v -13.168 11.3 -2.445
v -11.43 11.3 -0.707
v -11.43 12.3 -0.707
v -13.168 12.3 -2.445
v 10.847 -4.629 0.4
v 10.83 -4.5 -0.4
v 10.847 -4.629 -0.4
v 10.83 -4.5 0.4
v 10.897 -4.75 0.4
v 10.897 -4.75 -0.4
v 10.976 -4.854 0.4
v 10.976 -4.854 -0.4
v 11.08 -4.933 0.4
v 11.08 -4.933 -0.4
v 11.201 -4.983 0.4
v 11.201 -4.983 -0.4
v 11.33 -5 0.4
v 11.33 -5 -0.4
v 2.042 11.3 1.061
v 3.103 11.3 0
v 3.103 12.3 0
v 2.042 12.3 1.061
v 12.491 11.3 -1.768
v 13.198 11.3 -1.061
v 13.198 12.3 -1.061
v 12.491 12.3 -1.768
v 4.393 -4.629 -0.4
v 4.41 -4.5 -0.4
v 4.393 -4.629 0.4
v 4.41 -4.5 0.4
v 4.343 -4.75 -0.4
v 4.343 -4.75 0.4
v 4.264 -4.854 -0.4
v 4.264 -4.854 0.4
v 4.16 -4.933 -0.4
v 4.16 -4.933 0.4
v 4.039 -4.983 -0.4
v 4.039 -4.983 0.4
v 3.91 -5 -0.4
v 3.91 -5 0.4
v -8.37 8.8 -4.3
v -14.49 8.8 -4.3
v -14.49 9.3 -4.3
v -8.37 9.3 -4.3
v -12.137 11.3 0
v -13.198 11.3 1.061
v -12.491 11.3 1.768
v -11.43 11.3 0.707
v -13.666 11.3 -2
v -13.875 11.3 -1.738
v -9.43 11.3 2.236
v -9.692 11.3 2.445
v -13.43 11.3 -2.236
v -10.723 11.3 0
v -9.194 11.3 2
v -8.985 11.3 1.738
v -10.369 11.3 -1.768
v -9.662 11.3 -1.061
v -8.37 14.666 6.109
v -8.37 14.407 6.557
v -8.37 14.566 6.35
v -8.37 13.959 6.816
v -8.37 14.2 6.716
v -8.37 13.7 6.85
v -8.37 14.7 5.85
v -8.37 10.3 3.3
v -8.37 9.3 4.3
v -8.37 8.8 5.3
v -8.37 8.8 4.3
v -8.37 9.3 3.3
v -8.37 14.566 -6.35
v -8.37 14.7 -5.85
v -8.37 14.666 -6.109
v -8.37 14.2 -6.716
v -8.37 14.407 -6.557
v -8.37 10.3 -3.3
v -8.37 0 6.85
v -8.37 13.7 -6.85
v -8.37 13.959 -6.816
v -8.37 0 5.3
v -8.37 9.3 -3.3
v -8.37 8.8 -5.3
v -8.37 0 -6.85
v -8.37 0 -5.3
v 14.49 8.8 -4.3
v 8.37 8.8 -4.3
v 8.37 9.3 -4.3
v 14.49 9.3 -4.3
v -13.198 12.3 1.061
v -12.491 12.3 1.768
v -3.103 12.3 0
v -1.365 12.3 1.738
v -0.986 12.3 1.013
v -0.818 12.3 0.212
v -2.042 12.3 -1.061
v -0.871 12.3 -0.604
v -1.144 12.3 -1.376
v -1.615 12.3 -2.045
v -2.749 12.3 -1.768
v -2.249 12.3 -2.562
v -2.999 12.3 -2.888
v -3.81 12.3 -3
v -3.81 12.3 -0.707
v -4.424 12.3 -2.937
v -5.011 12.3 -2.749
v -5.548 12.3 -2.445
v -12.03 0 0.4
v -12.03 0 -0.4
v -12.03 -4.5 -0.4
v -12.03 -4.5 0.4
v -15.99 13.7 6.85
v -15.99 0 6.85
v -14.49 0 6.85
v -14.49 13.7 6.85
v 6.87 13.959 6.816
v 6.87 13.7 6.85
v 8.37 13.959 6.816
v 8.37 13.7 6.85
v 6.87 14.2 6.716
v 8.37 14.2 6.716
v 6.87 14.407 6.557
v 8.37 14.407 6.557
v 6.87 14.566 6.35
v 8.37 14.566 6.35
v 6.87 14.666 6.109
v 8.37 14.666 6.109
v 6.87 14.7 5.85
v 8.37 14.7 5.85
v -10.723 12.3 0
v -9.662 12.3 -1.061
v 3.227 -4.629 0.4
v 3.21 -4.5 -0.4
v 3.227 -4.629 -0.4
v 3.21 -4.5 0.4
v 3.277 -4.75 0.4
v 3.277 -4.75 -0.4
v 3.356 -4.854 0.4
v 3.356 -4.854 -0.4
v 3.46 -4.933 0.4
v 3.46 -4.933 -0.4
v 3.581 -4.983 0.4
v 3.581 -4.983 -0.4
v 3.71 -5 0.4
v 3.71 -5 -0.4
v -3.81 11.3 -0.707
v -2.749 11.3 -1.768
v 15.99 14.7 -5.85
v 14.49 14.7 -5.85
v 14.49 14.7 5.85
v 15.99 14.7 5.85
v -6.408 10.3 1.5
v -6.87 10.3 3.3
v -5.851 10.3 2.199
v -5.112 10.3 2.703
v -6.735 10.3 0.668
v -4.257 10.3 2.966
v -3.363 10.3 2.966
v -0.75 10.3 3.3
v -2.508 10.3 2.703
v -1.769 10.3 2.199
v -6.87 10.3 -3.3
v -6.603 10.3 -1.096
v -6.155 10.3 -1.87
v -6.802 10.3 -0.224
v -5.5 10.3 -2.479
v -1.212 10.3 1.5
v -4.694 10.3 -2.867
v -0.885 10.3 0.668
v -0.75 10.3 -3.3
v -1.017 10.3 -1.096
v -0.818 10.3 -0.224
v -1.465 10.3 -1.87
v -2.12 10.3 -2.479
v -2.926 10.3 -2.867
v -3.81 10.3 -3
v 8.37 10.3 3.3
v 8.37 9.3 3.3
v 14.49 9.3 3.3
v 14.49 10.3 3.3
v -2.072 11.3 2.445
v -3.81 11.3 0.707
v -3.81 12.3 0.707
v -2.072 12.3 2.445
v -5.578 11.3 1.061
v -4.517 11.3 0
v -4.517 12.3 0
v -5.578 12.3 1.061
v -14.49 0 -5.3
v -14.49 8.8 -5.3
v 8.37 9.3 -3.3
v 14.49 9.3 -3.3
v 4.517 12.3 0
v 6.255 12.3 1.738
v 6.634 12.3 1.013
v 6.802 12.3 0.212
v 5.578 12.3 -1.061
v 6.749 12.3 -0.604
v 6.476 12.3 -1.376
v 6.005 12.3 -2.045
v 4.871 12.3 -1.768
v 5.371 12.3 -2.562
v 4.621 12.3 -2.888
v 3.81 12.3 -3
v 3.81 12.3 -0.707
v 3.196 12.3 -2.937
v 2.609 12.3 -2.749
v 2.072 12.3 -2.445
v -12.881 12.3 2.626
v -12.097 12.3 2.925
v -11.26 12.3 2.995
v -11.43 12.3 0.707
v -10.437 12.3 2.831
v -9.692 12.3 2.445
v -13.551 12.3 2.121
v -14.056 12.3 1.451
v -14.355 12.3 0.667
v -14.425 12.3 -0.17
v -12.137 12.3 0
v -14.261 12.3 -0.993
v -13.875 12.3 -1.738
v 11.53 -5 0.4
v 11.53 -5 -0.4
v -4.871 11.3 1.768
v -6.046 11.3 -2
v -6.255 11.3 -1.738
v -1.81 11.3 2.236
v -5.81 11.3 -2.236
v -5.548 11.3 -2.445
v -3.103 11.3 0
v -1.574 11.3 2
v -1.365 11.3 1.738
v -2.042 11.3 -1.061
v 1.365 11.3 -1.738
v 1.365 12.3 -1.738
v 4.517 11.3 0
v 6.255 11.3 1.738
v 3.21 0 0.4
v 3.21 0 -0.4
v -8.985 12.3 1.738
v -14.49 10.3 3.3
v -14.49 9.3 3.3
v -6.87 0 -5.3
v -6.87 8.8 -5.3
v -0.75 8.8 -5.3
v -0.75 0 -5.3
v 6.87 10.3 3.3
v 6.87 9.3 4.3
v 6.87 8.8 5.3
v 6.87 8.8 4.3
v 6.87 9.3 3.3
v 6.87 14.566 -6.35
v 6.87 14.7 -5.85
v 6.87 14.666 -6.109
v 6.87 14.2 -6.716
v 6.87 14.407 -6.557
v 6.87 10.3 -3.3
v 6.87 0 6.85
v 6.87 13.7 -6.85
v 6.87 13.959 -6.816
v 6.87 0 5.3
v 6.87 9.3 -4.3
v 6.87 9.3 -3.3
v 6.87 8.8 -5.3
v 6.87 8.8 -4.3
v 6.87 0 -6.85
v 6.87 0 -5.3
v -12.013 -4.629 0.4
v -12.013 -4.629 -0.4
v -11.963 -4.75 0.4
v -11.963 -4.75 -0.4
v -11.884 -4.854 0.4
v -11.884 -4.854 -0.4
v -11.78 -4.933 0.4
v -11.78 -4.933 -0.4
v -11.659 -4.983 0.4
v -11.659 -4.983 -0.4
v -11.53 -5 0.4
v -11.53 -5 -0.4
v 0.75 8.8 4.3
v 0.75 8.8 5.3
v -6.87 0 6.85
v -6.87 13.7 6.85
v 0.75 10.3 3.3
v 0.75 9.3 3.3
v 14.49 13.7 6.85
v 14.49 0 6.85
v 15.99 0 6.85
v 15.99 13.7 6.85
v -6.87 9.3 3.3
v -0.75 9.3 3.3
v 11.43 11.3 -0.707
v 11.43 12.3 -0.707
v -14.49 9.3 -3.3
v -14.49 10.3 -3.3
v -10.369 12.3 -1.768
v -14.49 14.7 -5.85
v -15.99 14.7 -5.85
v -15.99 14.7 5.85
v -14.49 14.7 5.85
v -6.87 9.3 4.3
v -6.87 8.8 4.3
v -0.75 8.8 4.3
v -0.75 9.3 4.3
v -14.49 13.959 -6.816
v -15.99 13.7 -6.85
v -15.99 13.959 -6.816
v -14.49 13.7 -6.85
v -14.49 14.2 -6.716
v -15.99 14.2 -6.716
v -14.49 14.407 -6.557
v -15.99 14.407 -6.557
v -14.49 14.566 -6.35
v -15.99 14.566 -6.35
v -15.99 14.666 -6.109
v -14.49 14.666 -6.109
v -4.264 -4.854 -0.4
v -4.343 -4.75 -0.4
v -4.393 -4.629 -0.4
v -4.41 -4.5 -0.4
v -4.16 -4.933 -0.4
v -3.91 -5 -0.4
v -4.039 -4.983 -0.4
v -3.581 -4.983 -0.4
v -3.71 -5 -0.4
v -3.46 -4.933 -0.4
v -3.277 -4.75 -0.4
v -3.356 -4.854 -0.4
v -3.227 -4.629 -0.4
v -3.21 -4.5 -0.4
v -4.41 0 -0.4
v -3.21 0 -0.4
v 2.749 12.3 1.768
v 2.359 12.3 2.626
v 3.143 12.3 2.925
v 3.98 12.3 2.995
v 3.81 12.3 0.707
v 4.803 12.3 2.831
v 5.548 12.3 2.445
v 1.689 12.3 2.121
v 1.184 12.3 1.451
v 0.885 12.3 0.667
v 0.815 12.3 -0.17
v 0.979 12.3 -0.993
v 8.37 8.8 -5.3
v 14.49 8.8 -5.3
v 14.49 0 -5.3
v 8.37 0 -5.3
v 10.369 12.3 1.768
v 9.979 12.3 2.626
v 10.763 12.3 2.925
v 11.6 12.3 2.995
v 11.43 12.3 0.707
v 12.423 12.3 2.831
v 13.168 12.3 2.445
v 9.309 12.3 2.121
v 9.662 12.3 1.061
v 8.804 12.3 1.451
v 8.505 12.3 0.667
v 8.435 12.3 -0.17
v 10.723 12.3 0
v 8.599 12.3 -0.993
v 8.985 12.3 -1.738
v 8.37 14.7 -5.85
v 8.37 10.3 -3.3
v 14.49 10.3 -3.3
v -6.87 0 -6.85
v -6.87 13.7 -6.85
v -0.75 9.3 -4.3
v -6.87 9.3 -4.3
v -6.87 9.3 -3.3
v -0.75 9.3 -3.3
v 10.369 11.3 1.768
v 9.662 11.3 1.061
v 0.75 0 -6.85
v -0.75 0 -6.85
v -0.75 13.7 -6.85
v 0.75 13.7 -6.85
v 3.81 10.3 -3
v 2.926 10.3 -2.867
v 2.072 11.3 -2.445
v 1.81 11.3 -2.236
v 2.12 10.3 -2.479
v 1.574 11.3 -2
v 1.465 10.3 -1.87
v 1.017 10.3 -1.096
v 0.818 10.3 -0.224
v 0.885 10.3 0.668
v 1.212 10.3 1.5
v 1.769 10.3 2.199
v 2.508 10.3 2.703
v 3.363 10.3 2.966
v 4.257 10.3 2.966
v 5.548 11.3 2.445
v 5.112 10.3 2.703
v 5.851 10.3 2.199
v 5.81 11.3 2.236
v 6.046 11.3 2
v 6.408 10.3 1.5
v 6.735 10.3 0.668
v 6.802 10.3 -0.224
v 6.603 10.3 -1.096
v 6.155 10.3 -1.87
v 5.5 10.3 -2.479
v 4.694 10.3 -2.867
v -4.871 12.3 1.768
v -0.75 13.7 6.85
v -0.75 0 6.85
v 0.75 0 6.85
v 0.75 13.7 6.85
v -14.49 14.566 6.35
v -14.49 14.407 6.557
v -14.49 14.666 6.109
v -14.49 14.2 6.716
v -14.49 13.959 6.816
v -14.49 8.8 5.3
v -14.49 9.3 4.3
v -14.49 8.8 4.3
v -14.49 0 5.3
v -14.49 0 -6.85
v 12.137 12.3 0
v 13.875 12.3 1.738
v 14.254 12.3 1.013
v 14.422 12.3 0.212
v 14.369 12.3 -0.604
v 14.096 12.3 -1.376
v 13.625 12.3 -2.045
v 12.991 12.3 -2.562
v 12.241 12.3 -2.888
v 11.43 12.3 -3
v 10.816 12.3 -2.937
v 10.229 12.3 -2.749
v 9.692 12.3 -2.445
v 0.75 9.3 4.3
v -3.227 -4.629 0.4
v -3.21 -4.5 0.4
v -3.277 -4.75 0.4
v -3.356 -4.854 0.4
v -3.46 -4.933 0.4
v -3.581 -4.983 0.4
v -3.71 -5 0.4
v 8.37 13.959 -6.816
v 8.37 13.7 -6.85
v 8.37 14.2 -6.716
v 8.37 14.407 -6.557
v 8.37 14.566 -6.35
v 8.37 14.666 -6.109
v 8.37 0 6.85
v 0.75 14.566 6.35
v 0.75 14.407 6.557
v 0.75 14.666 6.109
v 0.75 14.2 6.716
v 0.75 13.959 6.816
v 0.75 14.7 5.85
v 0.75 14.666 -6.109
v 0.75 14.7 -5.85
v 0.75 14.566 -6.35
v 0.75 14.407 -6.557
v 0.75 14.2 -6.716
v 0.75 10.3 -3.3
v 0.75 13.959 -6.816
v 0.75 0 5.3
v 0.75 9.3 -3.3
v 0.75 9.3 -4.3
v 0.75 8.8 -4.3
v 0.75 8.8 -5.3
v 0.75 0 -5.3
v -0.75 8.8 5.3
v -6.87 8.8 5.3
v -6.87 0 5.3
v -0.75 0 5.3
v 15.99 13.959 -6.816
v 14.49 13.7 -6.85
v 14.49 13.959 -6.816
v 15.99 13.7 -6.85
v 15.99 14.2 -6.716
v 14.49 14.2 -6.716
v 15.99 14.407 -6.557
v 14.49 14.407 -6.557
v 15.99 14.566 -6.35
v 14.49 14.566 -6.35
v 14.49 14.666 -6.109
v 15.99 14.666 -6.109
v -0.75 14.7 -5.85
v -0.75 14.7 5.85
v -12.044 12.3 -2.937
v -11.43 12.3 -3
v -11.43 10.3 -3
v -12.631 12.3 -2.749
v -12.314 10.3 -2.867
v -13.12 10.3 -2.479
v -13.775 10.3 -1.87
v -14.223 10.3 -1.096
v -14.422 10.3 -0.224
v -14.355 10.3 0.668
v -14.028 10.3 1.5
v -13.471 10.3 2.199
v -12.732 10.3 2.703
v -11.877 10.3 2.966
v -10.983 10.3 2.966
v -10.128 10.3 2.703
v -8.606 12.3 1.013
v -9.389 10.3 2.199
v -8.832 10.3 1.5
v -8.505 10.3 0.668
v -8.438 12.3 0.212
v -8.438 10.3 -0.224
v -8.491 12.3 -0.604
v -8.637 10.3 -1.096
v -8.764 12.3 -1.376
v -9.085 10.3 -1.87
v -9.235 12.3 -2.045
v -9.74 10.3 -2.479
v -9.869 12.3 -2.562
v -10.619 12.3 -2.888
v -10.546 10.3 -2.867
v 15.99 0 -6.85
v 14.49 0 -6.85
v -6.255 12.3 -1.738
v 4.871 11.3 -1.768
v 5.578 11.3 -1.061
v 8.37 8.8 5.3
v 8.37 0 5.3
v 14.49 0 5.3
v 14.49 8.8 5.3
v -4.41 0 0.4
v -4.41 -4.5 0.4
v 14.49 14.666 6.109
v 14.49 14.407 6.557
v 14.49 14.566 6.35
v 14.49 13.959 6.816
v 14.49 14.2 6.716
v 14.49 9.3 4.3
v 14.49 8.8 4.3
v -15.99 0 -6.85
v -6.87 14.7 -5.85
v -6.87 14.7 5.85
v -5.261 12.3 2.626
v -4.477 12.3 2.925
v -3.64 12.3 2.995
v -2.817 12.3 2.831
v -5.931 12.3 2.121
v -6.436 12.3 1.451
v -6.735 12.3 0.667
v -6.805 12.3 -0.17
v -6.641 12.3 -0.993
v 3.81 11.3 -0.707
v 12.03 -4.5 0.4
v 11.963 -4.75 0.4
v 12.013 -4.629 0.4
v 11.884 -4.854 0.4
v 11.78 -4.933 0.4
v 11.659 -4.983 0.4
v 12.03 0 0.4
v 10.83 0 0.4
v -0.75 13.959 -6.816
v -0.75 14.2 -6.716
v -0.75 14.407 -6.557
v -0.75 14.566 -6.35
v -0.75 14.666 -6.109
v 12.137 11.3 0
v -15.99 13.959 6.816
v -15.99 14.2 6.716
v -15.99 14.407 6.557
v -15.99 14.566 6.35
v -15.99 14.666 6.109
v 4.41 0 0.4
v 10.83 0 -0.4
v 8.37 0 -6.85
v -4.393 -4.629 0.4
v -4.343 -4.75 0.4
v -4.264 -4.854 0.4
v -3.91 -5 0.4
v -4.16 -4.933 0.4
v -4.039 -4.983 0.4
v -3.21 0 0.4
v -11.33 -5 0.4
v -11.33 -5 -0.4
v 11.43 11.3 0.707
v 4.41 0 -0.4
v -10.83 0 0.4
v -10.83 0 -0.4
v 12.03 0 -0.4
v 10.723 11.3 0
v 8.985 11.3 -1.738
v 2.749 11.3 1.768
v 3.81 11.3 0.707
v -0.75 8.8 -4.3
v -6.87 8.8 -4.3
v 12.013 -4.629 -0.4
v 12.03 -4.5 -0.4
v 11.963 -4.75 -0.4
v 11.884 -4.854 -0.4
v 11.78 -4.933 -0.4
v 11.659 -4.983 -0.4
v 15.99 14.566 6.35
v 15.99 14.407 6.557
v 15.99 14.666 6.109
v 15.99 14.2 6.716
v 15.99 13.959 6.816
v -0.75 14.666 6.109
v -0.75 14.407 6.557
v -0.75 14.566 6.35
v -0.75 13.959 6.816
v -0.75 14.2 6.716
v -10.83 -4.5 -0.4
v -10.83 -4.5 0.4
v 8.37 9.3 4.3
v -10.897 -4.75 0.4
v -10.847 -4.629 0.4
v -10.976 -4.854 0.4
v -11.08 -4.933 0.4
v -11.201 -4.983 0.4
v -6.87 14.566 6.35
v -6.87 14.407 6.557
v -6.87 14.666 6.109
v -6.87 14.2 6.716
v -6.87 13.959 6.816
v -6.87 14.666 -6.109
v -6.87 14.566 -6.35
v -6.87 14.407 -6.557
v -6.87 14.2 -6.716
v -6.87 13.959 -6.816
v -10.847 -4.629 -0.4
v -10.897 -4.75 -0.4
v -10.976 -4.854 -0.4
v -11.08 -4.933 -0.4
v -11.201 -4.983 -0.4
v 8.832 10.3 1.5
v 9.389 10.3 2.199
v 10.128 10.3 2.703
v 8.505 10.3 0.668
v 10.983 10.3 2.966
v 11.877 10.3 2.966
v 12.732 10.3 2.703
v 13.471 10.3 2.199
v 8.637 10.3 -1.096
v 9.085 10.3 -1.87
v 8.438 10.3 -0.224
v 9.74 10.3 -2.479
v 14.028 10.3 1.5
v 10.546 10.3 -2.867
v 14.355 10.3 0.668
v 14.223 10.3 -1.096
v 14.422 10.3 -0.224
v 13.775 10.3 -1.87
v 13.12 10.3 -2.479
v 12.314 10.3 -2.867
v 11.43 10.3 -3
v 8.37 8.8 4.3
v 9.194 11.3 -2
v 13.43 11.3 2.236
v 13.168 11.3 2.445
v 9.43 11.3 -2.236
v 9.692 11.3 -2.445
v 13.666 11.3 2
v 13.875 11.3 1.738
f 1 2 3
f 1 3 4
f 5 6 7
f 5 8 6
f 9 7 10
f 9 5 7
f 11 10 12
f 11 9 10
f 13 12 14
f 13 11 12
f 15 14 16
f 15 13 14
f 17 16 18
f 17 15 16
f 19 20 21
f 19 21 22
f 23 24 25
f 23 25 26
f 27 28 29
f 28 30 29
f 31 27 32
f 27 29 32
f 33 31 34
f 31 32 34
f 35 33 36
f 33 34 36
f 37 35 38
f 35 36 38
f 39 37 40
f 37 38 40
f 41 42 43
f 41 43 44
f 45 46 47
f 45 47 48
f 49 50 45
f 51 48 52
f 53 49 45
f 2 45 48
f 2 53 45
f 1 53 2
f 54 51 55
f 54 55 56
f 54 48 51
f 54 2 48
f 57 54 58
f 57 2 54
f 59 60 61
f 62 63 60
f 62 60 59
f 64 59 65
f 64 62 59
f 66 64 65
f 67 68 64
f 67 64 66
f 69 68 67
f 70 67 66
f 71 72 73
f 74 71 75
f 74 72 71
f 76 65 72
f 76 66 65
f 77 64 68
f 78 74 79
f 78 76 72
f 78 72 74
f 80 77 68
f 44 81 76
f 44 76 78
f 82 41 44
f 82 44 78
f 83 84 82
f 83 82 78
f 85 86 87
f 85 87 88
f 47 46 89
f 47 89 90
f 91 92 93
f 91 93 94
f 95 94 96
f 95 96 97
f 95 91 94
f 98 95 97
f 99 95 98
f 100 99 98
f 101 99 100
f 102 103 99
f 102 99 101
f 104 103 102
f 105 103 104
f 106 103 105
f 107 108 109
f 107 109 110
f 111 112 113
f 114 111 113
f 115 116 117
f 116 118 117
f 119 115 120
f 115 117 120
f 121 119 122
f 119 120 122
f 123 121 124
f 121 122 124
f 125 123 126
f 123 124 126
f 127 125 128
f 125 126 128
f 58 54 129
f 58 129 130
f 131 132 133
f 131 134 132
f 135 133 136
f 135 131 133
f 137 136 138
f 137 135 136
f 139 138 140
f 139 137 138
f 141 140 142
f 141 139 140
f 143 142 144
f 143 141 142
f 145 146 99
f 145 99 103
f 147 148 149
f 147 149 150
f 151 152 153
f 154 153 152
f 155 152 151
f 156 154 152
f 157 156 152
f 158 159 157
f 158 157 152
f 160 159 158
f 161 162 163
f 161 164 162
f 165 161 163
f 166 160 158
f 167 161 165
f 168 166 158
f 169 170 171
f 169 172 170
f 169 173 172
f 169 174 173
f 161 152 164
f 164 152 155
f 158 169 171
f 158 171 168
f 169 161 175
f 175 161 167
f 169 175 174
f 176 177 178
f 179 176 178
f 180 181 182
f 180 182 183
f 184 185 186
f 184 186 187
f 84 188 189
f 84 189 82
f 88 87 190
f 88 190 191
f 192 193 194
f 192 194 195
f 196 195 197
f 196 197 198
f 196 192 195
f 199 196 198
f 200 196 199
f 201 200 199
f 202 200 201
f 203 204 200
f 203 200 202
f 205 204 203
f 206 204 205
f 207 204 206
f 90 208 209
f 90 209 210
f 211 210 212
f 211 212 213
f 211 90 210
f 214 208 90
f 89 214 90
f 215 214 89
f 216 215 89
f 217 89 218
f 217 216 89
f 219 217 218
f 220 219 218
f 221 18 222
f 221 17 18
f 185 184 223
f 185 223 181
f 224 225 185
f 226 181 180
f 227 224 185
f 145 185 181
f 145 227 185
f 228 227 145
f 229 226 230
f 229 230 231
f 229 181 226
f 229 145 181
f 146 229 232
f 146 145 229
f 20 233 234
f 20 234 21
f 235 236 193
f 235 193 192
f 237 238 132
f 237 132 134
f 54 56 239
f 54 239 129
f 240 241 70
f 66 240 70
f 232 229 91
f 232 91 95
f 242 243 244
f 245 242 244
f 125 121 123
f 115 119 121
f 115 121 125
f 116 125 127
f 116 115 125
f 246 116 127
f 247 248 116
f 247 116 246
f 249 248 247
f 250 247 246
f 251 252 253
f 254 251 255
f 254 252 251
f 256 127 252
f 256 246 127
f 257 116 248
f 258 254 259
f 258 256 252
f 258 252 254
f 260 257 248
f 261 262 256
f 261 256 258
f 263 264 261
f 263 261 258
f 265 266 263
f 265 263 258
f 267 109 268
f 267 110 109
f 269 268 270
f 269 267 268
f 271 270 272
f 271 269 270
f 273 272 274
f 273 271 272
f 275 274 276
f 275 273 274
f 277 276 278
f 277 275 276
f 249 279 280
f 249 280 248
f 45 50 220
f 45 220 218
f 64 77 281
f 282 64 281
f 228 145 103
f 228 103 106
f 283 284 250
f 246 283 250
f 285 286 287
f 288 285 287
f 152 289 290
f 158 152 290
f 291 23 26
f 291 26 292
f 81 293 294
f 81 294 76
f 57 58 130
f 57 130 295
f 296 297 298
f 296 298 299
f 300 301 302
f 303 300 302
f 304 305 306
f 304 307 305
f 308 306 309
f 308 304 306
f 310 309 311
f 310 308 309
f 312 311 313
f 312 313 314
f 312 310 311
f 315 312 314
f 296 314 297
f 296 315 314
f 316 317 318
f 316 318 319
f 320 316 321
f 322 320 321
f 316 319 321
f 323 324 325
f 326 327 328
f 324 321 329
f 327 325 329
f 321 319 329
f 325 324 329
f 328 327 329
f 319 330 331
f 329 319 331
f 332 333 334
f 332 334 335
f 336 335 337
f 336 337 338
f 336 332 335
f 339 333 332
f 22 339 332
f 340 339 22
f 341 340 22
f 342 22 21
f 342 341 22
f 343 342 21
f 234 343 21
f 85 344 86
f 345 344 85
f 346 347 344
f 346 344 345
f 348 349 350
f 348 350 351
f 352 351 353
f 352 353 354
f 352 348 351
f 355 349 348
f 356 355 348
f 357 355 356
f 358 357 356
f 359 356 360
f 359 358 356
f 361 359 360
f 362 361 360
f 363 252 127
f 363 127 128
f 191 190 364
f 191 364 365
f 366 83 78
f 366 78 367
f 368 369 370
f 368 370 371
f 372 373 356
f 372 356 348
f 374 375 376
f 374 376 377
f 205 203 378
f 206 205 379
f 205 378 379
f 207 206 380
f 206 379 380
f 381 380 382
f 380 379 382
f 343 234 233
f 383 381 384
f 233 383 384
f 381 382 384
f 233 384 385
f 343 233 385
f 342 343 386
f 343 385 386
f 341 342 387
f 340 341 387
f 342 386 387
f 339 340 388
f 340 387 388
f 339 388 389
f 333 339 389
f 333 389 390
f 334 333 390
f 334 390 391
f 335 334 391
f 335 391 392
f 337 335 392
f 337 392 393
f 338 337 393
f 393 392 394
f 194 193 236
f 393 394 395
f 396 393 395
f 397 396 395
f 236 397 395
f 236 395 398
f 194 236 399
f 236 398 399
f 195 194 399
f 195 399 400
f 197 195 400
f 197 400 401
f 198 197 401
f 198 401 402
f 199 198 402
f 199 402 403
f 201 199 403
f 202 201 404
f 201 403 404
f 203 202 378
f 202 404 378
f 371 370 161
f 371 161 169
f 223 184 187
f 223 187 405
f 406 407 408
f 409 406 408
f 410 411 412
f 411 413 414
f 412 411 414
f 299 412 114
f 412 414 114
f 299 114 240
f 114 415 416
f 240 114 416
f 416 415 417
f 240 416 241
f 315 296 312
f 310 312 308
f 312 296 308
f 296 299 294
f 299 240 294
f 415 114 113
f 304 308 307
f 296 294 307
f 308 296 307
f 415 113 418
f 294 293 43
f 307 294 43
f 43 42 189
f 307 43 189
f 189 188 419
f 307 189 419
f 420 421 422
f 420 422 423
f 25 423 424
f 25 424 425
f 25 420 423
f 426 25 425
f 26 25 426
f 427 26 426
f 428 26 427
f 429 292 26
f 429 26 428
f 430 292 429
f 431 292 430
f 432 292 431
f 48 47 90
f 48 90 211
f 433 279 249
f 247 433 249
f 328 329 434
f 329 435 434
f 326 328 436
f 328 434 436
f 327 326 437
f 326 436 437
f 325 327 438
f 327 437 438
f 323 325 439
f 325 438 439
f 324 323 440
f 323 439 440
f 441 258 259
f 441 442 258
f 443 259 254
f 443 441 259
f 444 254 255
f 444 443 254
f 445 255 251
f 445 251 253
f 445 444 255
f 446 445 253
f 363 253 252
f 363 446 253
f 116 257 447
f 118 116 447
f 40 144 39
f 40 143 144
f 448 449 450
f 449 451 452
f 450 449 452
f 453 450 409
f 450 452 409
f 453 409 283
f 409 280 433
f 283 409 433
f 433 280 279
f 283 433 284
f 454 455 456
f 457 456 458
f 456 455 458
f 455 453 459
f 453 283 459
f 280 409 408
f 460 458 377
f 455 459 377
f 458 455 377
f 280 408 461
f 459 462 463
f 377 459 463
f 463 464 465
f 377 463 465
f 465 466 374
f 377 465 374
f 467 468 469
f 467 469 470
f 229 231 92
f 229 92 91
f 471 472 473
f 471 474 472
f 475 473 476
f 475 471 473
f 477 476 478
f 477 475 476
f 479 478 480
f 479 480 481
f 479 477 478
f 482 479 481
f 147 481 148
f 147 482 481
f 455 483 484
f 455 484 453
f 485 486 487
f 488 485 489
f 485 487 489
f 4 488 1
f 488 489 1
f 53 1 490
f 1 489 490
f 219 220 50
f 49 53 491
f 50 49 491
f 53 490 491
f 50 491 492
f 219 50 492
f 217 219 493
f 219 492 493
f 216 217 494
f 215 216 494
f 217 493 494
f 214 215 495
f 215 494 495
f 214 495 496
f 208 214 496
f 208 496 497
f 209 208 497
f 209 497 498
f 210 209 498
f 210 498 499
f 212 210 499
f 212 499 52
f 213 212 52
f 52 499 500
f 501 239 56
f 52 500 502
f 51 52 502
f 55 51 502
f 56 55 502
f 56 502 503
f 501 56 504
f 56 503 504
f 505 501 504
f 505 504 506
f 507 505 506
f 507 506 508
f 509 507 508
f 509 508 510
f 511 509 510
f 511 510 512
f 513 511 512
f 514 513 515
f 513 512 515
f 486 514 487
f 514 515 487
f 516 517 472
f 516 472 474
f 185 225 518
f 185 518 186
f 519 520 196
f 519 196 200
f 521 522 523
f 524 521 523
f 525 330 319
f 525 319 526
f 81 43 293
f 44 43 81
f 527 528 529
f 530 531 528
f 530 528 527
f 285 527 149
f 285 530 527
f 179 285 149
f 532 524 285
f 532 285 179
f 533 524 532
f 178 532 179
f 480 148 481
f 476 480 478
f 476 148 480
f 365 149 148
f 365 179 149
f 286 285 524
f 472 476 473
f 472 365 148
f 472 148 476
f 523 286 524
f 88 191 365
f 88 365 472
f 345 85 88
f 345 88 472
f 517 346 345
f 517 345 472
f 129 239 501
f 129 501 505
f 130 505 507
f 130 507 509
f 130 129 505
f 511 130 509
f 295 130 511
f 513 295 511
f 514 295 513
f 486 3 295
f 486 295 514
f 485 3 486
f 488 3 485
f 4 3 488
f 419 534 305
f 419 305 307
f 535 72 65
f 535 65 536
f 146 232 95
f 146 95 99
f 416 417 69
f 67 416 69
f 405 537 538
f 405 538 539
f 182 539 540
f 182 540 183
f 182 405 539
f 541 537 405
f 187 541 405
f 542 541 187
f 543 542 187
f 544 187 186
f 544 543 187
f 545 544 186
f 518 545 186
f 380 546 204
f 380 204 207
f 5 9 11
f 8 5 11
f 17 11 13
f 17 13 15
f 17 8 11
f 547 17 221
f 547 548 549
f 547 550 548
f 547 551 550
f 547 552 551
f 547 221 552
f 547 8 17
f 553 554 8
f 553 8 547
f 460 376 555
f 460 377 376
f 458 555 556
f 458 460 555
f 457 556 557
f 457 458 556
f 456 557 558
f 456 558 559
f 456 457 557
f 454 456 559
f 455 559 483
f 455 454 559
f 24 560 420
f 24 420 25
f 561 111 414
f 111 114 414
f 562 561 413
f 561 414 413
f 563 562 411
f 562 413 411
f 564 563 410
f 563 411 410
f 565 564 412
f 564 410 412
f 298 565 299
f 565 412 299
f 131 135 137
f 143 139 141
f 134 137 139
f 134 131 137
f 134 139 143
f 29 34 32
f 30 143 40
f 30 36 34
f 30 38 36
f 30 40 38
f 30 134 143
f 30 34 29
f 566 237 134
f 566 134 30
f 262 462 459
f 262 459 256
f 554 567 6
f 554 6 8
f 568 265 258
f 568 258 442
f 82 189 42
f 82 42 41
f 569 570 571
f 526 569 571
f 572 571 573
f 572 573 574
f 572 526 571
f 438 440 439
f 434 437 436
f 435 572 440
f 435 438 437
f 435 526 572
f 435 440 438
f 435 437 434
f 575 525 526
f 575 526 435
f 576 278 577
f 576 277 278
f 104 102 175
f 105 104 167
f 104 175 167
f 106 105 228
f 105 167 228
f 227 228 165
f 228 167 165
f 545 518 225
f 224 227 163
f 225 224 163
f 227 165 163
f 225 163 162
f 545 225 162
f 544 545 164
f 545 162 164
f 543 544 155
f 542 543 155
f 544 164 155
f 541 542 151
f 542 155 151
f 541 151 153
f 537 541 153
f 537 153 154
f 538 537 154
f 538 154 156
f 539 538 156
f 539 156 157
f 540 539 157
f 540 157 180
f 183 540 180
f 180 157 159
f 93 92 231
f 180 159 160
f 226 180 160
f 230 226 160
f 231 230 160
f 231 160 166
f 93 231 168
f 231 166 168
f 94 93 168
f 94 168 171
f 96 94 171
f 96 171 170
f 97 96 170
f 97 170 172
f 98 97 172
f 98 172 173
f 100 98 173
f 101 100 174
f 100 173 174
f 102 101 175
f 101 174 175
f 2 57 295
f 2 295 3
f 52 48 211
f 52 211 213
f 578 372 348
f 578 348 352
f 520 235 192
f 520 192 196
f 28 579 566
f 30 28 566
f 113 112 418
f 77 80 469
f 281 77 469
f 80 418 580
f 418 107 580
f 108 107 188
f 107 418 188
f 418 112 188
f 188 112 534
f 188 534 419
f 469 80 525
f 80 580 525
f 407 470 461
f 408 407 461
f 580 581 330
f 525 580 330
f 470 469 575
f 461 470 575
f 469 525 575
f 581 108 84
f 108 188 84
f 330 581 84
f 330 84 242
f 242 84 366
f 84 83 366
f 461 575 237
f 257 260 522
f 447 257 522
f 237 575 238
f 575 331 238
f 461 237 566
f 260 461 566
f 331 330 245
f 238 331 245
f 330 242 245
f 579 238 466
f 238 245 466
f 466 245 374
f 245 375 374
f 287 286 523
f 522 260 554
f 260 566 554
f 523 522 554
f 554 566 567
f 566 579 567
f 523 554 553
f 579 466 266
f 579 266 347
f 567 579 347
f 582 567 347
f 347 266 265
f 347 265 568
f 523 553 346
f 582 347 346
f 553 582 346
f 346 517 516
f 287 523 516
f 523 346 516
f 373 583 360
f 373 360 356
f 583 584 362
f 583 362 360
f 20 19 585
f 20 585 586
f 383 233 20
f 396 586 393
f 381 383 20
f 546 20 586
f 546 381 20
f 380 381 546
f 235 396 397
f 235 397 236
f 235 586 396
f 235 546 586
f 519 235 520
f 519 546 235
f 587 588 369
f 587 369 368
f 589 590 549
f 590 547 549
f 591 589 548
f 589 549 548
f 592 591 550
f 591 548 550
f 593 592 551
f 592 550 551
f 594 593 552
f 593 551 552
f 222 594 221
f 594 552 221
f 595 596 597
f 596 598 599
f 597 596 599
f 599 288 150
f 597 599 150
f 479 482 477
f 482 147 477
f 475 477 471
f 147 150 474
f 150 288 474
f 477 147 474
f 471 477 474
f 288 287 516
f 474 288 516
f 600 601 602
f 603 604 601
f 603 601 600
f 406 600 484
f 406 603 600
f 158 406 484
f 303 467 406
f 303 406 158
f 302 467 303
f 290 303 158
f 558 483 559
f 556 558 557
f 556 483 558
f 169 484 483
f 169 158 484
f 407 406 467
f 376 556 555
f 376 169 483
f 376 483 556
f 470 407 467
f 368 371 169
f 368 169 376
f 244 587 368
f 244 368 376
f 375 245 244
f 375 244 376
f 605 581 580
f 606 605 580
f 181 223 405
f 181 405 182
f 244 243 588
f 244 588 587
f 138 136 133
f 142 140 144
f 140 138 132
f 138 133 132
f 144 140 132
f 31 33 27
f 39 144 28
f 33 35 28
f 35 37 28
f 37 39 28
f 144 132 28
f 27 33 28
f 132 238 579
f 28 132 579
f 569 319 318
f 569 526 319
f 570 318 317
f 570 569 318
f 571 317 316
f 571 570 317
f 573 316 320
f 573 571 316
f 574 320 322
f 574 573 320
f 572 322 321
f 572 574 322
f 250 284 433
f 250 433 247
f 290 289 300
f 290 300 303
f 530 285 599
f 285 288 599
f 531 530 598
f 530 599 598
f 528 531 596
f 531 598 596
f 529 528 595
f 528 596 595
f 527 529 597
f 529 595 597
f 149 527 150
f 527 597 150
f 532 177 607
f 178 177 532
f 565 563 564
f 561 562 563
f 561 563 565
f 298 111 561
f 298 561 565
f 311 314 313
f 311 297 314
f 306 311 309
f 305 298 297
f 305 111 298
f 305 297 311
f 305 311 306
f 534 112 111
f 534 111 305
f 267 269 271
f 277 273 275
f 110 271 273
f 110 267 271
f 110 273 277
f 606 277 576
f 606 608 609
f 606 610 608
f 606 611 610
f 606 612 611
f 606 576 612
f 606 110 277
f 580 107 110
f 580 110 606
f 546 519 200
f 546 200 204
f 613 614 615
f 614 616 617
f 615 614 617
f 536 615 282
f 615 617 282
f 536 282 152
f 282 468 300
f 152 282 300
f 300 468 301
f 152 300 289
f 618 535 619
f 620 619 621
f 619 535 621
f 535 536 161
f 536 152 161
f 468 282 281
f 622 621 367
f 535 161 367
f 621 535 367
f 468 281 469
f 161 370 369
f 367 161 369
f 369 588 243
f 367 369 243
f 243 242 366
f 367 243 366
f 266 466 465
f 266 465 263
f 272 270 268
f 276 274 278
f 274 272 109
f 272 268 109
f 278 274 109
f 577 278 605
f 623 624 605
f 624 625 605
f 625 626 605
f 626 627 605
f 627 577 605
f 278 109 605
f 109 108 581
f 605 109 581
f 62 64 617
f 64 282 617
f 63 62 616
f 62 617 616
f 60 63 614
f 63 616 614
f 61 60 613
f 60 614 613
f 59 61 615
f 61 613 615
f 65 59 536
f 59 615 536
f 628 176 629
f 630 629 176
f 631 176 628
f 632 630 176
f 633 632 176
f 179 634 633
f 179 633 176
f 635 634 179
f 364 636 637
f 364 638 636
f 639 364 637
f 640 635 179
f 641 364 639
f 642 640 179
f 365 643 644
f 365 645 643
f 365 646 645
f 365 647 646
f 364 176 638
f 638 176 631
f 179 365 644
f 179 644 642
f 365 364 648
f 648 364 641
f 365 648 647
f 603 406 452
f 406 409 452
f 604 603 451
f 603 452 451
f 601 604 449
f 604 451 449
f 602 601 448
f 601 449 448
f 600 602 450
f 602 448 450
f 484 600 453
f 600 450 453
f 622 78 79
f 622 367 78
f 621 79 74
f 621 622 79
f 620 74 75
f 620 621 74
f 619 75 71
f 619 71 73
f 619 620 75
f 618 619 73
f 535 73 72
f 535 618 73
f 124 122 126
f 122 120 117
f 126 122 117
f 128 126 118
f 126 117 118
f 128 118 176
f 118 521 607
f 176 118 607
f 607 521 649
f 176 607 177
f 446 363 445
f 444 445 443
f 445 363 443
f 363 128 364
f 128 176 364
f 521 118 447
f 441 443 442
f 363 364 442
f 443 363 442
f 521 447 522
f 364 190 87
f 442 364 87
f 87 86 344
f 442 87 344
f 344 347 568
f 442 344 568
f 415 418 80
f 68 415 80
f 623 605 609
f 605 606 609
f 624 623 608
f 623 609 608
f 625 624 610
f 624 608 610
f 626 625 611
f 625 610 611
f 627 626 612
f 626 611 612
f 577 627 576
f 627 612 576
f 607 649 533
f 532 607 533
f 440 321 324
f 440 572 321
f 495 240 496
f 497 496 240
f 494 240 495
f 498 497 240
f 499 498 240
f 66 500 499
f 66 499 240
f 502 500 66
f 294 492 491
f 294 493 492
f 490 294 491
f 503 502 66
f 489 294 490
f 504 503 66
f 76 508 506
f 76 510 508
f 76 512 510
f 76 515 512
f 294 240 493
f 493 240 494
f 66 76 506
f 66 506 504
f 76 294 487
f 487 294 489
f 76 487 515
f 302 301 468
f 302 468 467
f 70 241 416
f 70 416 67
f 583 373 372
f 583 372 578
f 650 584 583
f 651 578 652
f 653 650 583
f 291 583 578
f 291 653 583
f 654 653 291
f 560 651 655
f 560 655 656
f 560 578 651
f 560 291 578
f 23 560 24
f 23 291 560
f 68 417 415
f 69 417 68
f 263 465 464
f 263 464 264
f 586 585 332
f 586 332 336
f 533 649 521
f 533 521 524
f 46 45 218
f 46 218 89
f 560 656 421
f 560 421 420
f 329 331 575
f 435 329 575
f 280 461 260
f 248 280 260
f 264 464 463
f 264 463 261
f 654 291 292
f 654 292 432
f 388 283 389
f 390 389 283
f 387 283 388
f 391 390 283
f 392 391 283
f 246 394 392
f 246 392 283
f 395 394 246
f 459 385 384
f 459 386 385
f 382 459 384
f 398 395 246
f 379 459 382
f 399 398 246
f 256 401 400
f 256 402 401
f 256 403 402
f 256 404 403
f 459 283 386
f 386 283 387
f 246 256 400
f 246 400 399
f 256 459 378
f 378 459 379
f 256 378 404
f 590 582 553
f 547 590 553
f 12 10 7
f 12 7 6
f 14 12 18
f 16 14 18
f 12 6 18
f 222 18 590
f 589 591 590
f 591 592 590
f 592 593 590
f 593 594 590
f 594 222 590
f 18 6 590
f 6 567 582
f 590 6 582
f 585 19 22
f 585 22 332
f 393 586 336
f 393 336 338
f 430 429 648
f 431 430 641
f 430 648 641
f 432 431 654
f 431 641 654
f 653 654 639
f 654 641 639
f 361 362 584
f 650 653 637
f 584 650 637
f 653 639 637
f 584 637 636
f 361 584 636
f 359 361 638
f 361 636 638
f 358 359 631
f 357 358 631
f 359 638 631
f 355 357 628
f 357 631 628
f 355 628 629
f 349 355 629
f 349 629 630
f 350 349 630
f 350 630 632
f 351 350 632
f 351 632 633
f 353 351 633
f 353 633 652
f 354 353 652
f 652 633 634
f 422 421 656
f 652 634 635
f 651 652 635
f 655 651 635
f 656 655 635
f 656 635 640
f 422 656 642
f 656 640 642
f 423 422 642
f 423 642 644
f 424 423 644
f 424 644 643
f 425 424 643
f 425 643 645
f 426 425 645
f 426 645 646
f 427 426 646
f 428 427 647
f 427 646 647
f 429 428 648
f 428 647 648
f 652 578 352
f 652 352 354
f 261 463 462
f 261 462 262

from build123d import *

# Parameters (mm, degrees)
CROQUIS1_W                  = 1.5
CROQUIS1_H                  = 13.7
SALIENTE_EXTRUIR1_DEPTH     = 14.7
REDONDEO1_R                 = 1
MATRIZL1_COUNT              = 3
MATRIZL1_PITCH              = 7.62
MATRIZL1_2_COUNT            = 3
MATRIZL1_2_PITCH            = 7.62
CROQUIS2_W                  = 31.98
CROQUIS2_H                  = 10.6
SALIENTE_EXTRUIR2_DEPTH     = 8.8
CROQUIS4_W                  = 1.2
CROQUIS4_H                  = 0.8
SALIENTE_EXTRUIR5_DEPTH     = 5
REDONDEO4_R                 = 0.5
MATRIZL2_COUNT              = 2
MATRIZL2_PITCH              = 7.62
REDONDEO4_OF_MATRIZL2_R     = 0.5
MATRIZL2_COL_COUNT          = 3
MATRIZL2_COL_PITCH          = 7.62
REDONDEO4_OF_MATRIZL2_COL_R = 0.5
CROQUIS5_W                  = 6.12
CROQUIS5_H                  = 8.6
SALIENTE_EXTRUIR6_DEPTH     = 0.5
CROQUIS6_W                  = 6.12
CROQUIS6_H                  = 6.6
SALIENTE_EXTRUIR7_DEPTH     = 1
CROQUIS7_R                  = 3
SALIENTE_EXTRUIR14_DEPTH    = 2
CORTAR_EXTRUIR2_START       = -1
CORTAR_EXTRUIR2_DEPTH       = 1
MATRIZL3_COUNT              = 2
MATRIZL3_PITCH              = 7.62
MATRIZL3_COL_COUNT          = 3
MATRIZL3_COL_PITCH          = 7.62


with BuildPart() as part:
    # Croquis1 → Saliente-Extruir1 (new body)
    with BuildSketch(Plane(origin=(0, 0, 0), x_dir=(1, 0, 0), z_dir=(0, 1, 0))):
        Rectangle(CROQUIS1_W, CROQUIS1_H)
    extrude(amount=SALIENTE_EXTRUIR1_DEPTH)

    # Redondeo1
    redondeo1_edges = [part.edges().sort_by_distance(p)[0] for p in [
        (0, 14.7, 6.85),
        (0, 14.7, -6.85),
    ]]
    fillet(redondeo1_edges, radius=REDONDEO1_R)


with BuildPart() as matrizl1_1:
    # MatrizL1: pattern copy
    add(part.part.moved(Location(Vector(1, 0, 0) * (1 * MATRIZL1_PITCH))))


with BuildPart() as matrizl1_2:
    # MatrizL1: pattern copy
    add(part.part.moved(Location(Vector(1, 0, 0) * (2 * MATRIZL1_PITCH))))


with BuildPart() as matrizl1_2_1:
    # MatrizL1 2: pattern copy
    add(part.part.moved(Location(Vector(-1, 0, 0) * (1 * MATRIZL1_2_PITCH))))


with BuildPart() as matrizl1_2_2:
    # MatrizL1 2: pattern copy
    add(part.part.moved(Location(Vector(-1, 0, 0) * (2 * MATRIZL1_2_PITCH))))


with BuildPart() as part_1:
    add(part.part)

    add(matrizl1_1.part)  # Saliente-Extruir2 merges MatrizL1_1

    add(matrizl1_2.part)  # Saliente-Extruir2 merges MatrizL1_2

    add(matrizl1_2_1.part)  # Saliente-Extruir2 merges MatrizL1 2_1

    add(matrizl1_2_2.part)  # Saliente-Extruir2 merges MatrizL1 2_2
    # Croquis2 → Saliente-Extruir2 (add)
    with BuildSketch(Plane(origin=(0, 0, 0), x_dir=(1, 0, 0), z_dir=(0, 1, 0))):
        Rectangle(CROQUIS2_W, CROQUIS2_H)
    extrude(amount=SALIENTE_EXTRUIR2_DEPTH)

    # Croquis4 → Saliente-Extruir5 (add)
    with BuildSketch(Plane.XZ):
        with Locations((-3.81, 0)):
            Rectangle(CROQUIS4_W, CROQUIS4_H)
    saliente_extruir5 = extrude(amount=SALIENTE_EXTRUIR5_DEPTH)

    # Redondeo4
    redondeo4_edges = [part_1.edges().sort_by_distance(p)[0] for p in [
        (-3.21, -5, 0),
        (-4.41, -5, 0),
    ]]
    fillet(redondeo4_edges, radius=REDONDEO4_R)

    # MatrizL2: Saliente-Extruir5 ×2
    with Locations(*[(-i * MATRIZL2_PITCH, 0, 0) for i in range(1, MATRIZL2_COUNT)]):
        add(saliente_extruir5)

    # Redondeo4 of MatrizL2
    redondeo4_of_matrizl2_edges = [part_1.edges().sort_by_distance(p)[0] for p in [
        (-10.83, -5, 0),
        (-12.03, -5, 0),
    ]]
    fillet(redondeo4_of_matrizl2_edges, radius=REDONDEO4_OF_MATRIZL2_R)

    # MatrizL2 col: Saliente-Extruir5 ×3
    with Locations(*[(i * MATRIZL2_COL_PITCH, 0, 0) for i in range(1, MATRIZL2_COL_COUNT)]):
        add(saliente_extruir5)

    # Redondeo4 of MatrizL2 col
    redondeo4_of_matrizl2_col_edges = [part_1.edges().sort_by_distance(p)[0] for p in [
        (4.41, -5, 0),
        (3.21, -5, 0),
        (12.03, -5, 0),
        (10.83, -5, 0),
    ]]
    fillet(redondeo4_of_matrizl2_col_edges, radius=REDONDEO4_OF_MATRIZL2_COL_R)

    # Croquis5 → Saliente-Extruir6 (add)
    with BuildSketch(Plane(origin=(0, 8.8, 0), x_dir=(1, 0, 0), z_dir=(0, 1, 0))):
        with Locations((-3.81, 0)):
            Rectangle(CROQUIS5_W, CROQUIS5_H)
    saliente_extruir6 = extrude(amount=SALIENTE_EXTRUIR6_DEPTH)

    # Croquis6 → Saliente-Extruir7 (add)
    with BuildSketch(Plane(origin=(0, 9.3, 0), x_dir=(1, 0, 0), z_dir=(0, 1, 0))):
        with Locations((-3.81, 0)):
            Rectangle(CROQUIS6_W, CROQUIS6_H)
    saliente_extruir7 = extrude(amount=SALIENTE_EXTRUIR7_DEPTH)

    # Croquis7 → Saliente-Extruir14 (add)
    with BuildSketch(Plane(origin=(0, 10.3, 0), x_dir=(1, 0, 0), z_dir=(0, 1, 0))):
        with Locations(Location((-3.81, 0, 0), (0, 0, 90))):
            Circle(CROQUIS7_R)
    saliente_extruir14 = extrude(amount=SALIENTE_EXTRUIR14_DEPTH)

    # Croquis13 → Cortar-Extruir2 (cut)
    with BuildSketch(Plane(origin=(0, 12.3, 0), x_dir=(1, 0, 0), z_dir=(0, 1, 0)).offset(CORTAR_EXTRUIR2_START)):
        with BuildLine():
            ThreePointArc((-5.548096676, 2.445203457), (-5.931320344, 2.121320344), (-6.255203457, 1.738096676))
            Line((-6.255203457, 1.738096676), (-4.517106781, 0))
            Line((-4.517106781, 0), (-3.81, 0.707106781))
            Line((-3.81, 0.707106781), (-5.548096676, 2.445203457))
        make_face()
        Polygon((-3.81, 0.707106781), (-3.102893219, 0), (-2.042233047, 1.060660172), (-2.749339828, 1.767766953), align=None)
        Polygon((-4.870660172, -1.767766953), (-3.81, -0.707106781), (-4.517106781, 0), (-5.577766953, -1.060660172), align=None)
        Polygon((-4.517106781, 0), (-3.81, -0.707106781), (-3.102893219, 0), (-3.81, 0.707106781), align=None)
        with BuildLine():
            Line((-3.81, -0.707106781), (-2.071903324, -2.445203457))
            ThreePointArc((-2.071903324, -2.445203457), (-1.688679656, -2.121320344), (-1.364796543, -1.738096676))
            Line((-1.364796543, -1.738096676), (-3.102893219, 0))
            Line((-3.102893219, 0), (-3.81, -0.707106781))
        make_face()
    cortar_extruir2 = extrude(amount=CORTAR_EXTRUIR2_DEPTH, mode=Mode.SUBTRACT)

    # MatrizL3: Saliente-Extruir6, Saliente-Extruir7, Saliente-Extruir14, Cortar-Extruir2 ×2
    with Locations(*[(-i * MATRIZL3_PITCH, 0, 0) for i in range(1, MATRIZL3_COUNT)]):
        add(saliente_extruir6)
        add(saliente_extruir7)
        add(saliente_extruir14)
        add(cortar_extruir2, mode=Mode.SUBTRACT)

    # MatrizL3 col: Saliente-Extruir6, Saliente-Extruir7, Saliente-Extruir14, Cortar-Extruir2 ×3
    with Locations(*[(i * MATRIZL3_COL_PITCH, 0, 0) for i in range(1, MATRIZL3_COL_COUNT)]):
        add(saliente_extruir6)
        add(saliente_extruir7)
        add(saliente_extruir14)
        add(cortar_extruir2, mode=Mode.SUBTRACT)


solid = part_1.part
